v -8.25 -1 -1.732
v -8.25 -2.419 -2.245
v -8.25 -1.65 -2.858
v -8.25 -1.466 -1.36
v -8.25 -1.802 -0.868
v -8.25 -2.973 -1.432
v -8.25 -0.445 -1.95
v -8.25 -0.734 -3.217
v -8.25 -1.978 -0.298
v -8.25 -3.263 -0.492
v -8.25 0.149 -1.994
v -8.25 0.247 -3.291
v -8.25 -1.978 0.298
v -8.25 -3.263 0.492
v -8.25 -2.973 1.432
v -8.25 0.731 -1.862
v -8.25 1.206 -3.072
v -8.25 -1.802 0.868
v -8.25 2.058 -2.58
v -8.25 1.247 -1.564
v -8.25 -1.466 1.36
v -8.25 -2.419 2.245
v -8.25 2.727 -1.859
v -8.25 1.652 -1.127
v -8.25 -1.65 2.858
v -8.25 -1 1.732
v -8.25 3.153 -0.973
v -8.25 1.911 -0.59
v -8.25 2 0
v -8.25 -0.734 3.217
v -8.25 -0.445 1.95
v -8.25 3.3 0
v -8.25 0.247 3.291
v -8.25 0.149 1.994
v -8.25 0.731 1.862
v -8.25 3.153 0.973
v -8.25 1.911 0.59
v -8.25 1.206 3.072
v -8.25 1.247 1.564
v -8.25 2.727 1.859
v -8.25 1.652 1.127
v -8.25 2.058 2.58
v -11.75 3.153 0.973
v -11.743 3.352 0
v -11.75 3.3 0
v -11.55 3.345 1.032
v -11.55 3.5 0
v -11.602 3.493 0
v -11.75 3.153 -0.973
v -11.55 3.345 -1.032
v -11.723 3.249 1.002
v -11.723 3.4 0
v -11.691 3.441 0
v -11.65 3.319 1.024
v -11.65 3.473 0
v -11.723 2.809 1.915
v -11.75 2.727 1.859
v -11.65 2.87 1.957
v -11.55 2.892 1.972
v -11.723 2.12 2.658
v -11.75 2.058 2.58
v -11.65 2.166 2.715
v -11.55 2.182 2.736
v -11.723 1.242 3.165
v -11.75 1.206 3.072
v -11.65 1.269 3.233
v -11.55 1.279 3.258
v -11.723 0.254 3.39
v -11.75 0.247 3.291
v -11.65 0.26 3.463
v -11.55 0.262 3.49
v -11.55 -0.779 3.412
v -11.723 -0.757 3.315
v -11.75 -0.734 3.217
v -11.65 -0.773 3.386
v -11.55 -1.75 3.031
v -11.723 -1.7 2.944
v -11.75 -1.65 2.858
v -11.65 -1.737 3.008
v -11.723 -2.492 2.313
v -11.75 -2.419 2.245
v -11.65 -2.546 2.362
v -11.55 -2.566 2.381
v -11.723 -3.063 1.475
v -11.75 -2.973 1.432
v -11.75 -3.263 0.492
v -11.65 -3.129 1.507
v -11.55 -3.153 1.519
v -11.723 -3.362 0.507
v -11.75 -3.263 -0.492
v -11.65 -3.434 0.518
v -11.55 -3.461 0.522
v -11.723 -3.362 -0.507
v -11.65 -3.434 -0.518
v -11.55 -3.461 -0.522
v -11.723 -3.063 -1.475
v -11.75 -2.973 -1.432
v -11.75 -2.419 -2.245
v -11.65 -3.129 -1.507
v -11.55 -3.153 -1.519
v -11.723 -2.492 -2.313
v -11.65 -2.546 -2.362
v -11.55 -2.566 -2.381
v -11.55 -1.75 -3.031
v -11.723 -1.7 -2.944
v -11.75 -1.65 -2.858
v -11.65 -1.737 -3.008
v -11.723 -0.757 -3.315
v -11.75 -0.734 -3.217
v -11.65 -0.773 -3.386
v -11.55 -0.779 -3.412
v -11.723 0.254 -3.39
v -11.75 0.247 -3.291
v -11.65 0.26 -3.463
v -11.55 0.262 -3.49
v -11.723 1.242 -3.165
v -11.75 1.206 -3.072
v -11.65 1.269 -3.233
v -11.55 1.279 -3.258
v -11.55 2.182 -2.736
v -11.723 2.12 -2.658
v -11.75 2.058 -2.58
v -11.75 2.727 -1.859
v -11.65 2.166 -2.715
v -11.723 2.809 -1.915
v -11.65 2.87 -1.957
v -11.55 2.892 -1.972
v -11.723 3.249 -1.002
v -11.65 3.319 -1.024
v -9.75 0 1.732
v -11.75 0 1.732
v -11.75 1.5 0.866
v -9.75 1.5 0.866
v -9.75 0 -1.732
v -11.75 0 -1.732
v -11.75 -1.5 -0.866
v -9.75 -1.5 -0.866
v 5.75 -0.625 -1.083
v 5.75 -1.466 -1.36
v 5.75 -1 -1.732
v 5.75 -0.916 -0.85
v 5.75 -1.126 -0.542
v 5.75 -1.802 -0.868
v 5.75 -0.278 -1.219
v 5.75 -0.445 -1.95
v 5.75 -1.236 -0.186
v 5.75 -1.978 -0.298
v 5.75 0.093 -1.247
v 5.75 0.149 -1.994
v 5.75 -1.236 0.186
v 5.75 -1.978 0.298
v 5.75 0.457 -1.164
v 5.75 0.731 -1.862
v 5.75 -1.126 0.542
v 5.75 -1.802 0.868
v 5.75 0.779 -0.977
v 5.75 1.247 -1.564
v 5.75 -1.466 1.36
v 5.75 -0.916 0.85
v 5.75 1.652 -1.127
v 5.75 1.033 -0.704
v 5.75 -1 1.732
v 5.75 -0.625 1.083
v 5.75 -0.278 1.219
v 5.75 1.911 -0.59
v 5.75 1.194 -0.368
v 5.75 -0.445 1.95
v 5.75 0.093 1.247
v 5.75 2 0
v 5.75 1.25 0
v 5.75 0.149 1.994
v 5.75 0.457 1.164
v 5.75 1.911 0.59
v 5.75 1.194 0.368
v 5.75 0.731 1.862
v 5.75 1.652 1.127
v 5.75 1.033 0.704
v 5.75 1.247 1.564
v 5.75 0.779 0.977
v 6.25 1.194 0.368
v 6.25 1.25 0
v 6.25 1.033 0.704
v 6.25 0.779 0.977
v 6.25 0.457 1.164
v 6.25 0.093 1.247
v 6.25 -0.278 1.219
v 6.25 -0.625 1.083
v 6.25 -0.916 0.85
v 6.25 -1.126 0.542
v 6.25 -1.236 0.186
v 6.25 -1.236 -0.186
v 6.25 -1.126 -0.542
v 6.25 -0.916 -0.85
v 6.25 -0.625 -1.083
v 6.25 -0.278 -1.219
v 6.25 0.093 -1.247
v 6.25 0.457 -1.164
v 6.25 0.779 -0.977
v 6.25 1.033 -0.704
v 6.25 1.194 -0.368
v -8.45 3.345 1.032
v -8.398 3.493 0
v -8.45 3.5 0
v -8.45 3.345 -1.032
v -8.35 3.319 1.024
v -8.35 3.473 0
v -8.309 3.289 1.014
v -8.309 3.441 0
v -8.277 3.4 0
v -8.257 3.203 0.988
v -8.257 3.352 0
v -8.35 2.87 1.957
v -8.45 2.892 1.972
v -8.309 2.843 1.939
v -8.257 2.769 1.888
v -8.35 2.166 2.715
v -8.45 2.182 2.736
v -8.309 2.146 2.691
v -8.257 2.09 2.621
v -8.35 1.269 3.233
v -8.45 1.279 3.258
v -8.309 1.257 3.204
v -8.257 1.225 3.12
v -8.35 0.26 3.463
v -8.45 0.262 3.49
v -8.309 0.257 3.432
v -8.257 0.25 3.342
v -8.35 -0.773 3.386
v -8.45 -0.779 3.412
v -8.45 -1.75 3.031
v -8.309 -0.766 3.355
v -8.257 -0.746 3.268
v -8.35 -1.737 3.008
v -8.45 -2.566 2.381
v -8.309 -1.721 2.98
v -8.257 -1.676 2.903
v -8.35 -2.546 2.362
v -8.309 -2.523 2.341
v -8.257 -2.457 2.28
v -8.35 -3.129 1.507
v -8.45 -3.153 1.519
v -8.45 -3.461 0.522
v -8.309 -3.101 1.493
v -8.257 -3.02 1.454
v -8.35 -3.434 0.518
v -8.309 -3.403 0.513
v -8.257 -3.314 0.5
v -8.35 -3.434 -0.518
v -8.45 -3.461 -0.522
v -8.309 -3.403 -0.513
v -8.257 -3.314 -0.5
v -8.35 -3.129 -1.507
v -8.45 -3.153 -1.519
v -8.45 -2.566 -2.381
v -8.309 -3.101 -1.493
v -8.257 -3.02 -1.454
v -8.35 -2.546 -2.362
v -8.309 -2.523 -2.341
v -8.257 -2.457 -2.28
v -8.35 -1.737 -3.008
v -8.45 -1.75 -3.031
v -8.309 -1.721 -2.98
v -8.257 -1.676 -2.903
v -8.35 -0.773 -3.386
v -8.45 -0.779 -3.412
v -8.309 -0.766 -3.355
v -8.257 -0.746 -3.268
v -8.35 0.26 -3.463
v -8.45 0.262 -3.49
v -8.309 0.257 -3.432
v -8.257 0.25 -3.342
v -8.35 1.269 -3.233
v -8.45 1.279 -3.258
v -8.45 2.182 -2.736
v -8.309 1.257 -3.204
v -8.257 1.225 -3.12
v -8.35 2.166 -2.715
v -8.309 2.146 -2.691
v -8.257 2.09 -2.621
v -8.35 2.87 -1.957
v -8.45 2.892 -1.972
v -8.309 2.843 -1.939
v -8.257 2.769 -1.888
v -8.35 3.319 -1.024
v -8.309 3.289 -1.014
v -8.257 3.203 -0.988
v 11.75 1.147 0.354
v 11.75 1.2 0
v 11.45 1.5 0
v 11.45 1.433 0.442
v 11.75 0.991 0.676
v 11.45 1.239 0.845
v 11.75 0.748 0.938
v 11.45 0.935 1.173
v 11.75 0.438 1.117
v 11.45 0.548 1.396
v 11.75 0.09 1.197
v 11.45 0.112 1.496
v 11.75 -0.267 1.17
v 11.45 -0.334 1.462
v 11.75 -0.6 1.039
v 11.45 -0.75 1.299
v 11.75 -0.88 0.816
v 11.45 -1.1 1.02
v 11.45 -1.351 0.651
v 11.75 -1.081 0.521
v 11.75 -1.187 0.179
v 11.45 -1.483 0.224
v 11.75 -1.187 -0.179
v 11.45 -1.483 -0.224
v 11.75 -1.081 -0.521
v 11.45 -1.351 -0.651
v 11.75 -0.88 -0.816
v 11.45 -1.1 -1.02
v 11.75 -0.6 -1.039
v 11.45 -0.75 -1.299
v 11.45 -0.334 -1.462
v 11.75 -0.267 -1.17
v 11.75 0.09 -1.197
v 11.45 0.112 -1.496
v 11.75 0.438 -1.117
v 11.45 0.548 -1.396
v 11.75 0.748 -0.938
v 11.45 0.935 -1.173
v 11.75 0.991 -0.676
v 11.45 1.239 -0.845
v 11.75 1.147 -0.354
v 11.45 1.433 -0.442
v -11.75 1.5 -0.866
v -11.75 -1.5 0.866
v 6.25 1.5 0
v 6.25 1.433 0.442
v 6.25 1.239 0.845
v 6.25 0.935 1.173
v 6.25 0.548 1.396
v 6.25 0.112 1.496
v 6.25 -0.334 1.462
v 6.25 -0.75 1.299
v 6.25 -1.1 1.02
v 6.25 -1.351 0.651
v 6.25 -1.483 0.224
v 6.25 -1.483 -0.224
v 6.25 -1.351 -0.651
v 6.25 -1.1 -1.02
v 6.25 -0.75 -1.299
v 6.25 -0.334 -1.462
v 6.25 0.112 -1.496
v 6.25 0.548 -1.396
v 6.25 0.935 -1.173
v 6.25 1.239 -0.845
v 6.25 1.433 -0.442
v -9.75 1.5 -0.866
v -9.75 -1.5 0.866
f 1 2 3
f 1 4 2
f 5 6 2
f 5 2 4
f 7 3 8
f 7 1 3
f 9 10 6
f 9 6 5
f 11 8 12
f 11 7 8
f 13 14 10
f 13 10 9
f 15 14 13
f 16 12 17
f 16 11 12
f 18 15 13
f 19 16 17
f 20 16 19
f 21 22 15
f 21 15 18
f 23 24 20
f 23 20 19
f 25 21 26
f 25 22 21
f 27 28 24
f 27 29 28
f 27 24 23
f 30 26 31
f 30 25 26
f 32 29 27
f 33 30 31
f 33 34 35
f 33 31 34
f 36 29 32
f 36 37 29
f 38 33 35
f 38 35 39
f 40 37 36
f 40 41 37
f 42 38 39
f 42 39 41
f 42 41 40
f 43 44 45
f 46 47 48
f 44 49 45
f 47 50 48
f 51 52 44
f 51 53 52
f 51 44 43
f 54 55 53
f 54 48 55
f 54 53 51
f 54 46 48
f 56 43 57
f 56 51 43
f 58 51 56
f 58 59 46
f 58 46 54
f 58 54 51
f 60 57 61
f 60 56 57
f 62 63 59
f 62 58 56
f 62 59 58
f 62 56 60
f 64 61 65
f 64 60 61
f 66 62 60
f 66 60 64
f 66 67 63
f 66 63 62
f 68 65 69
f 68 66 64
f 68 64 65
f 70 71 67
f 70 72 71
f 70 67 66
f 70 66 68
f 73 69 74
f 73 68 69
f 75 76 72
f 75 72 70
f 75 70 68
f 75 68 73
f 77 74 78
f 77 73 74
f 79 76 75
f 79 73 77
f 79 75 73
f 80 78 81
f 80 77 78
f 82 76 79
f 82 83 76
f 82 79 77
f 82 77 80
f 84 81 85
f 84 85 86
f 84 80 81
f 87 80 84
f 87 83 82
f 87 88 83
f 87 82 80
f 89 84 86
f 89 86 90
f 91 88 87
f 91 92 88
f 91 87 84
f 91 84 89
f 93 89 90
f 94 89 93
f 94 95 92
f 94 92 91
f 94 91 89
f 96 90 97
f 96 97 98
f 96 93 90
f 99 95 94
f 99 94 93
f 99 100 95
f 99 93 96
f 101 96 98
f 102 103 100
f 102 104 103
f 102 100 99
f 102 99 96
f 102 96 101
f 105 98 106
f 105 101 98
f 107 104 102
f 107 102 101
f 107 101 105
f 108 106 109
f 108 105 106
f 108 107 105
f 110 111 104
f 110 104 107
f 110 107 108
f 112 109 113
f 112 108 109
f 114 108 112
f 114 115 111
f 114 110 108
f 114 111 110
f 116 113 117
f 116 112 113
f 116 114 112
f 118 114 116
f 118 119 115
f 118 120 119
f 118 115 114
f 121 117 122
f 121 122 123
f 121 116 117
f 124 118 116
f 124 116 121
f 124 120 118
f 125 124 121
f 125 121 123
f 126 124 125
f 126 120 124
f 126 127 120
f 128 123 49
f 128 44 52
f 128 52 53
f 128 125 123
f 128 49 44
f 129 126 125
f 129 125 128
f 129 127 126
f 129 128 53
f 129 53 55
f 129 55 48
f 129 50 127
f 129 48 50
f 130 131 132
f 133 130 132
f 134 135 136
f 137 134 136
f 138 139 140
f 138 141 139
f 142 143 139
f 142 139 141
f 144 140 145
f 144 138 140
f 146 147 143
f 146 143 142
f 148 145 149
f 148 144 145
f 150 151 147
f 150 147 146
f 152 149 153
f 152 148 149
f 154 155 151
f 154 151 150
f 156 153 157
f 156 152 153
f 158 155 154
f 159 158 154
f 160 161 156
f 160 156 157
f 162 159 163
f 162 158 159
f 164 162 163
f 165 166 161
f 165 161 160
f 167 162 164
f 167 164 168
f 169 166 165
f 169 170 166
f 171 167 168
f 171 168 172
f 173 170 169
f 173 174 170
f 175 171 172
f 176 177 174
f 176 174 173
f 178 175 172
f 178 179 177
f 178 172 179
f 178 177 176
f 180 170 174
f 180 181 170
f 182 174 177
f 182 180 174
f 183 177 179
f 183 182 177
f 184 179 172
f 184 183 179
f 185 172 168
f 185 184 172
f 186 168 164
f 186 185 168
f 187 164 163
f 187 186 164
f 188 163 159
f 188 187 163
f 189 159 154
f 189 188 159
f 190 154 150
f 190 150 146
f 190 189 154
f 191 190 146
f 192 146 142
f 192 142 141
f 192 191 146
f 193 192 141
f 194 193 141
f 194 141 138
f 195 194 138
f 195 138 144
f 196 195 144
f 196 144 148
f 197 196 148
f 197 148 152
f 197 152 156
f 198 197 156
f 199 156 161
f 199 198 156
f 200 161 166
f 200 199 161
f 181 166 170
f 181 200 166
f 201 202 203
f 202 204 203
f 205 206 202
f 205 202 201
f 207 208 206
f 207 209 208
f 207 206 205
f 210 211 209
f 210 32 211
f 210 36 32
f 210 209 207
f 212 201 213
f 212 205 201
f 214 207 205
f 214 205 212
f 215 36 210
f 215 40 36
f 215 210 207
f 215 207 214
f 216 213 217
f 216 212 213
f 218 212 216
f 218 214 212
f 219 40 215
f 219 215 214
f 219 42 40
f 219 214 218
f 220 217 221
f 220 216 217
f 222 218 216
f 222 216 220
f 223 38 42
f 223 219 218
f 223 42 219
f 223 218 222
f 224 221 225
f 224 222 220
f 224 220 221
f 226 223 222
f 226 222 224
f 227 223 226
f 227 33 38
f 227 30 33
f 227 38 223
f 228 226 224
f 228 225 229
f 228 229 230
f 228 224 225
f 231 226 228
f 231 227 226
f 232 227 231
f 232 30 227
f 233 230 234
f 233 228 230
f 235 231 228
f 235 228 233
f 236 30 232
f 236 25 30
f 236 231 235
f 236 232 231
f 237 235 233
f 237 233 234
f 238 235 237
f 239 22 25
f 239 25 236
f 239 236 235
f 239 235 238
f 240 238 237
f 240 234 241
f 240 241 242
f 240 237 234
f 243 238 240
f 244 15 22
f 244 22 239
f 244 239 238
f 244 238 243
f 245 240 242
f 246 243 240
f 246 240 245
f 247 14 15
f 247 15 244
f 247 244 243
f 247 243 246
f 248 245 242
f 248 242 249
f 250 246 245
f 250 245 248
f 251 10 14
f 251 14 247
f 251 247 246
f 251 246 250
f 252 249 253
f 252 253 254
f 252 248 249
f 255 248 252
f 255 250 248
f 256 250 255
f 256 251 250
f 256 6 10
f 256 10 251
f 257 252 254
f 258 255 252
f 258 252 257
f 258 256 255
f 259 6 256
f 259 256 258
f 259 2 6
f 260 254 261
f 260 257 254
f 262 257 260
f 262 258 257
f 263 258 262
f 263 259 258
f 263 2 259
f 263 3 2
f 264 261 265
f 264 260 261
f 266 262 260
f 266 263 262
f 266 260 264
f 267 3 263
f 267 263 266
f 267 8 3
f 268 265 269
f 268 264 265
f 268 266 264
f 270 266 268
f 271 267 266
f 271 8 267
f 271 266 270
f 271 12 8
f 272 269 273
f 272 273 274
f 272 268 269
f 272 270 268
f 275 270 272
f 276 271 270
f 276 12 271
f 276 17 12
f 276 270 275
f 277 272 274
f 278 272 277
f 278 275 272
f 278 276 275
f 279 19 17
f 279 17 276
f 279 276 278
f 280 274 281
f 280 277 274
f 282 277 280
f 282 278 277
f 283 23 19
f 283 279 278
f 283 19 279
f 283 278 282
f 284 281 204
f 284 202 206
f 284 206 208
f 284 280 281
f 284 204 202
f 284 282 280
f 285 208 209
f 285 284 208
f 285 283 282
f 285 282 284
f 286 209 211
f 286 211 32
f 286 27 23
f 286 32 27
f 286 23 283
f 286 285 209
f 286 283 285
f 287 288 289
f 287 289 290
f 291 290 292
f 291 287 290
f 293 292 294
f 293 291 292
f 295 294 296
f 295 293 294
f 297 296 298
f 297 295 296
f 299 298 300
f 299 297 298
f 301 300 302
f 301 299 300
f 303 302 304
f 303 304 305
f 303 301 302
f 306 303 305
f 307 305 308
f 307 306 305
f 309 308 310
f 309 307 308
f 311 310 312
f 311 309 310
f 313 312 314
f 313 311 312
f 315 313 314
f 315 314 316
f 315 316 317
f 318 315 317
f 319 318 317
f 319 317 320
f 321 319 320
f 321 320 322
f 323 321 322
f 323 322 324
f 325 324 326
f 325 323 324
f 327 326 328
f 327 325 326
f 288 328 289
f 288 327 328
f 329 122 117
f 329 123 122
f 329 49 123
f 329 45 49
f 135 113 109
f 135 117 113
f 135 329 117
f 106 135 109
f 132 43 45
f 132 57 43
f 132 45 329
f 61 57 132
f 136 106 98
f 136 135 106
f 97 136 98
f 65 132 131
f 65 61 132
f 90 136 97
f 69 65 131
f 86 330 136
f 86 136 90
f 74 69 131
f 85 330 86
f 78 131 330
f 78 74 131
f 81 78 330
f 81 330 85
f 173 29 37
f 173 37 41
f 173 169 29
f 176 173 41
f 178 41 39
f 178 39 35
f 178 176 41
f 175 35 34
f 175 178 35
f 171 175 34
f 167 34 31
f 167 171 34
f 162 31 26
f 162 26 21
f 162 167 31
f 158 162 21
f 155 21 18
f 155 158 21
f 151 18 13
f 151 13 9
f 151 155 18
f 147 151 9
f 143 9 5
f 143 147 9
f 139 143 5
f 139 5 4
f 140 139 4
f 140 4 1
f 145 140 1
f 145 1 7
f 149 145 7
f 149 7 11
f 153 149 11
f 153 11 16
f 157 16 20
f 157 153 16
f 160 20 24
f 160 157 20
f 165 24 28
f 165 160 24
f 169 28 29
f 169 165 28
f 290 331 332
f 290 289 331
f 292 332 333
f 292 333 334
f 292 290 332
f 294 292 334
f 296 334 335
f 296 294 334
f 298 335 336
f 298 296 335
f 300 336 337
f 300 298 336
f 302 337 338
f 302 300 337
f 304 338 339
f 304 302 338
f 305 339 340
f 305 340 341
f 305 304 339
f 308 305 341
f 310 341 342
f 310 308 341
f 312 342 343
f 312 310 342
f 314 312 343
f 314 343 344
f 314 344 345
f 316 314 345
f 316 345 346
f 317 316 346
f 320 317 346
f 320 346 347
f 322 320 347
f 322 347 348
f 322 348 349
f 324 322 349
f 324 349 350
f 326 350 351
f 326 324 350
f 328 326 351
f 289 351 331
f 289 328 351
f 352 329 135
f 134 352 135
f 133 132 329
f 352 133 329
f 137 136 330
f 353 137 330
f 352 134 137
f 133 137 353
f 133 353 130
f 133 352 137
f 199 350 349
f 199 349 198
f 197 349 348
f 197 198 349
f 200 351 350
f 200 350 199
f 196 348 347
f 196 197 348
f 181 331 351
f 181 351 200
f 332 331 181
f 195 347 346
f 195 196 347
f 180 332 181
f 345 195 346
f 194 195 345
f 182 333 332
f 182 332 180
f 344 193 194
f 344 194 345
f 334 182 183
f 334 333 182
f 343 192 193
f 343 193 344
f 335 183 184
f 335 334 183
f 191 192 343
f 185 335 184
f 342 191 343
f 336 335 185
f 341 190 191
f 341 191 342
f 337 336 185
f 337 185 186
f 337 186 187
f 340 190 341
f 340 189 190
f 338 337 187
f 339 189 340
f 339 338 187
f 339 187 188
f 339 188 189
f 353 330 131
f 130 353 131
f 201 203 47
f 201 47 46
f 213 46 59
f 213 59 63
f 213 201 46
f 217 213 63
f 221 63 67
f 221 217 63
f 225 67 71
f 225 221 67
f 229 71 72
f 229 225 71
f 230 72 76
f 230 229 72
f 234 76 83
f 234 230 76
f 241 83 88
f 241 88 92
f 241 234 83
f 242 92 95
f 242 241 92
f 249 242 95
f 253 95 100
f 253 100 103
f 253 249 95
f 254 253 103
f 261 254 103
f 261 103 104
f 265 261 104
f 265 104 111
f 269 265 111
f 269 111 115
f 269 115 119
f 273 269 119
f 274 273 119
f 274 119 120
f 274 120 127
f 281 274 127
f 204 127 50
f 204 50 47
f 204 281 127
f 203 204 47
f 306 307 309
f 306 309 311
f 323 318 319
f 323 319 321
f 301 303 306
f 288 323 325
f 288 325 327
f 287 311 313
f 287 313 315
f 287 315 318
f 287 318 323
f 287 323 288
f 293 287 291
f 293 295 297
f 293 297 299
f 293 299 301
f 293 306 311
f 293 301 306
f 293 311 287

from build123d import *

# Parameters (mm, degrees)
FILLET_1_R          = 0.2
CHAMFER_1_SIZE      = 0.3
SKETCH_3_W          = 0.5
SKETCH_3_H          = 0.25
CUT_EXTRUDE_1_DEPTH = 2


with BuildPart() as part:
    # 草图1 → 旋转1 (revolve)
    with BuildSketch(Plane.XY):
        Polygon((-11.75, 0), (-11.75, 3.5), (-8.25, 3.5), (-8.25, 2), (5.75, 2), (5.75, 1.5), (11.75, 1.5), (11.75, 0), align=None)
    revolve(axis=Axis((-11.75, 0, 0), (1, 0, 0)))

    # 圆角1
    fillet_1_edges = [part.edges().sort_by_distance(p)[0] for p in [
        (-8.25, -3.5, 0),
        (-11.75, -3.5, 0),
    ]]
    fillet(fillet_1_edges, radius=FILLET_1_R)

    # 倒角1
    chamfer_1_edges = [part.edges().sort_by_distance(p)[0] for p in [
        (11.75, -1.5, 0),
    ]]
    chamfer(chamfer_1_edges, length=CHAMFER_1_SIZE)

    # 草图3 → 切除-旋转1 (revolve, cut)
    with BuildSketch(Plane.XY):
        with Locations((6, 1.375)):
            Rectangle(SKETCH_3_W, SKETCH_3_H)
    revolve(axis=Axis((5.75, 0, 0), (1, 0, 0)), mode=Mode.SUBTRACT)

    # 草图4 → 切除-拉伸1 (cut)
    with BuildSketch(Plane.ZY.offset(11.75)):
        Polygon((1.732050808, 0), (0.866025404, 1.5), (-0.866025404, 1.5), (-1.732050808, 0), (-0.866025404, -1.5), (0.866025404, -1.5), align=None)
    extrude(amount=-CUT_EXTRUDE_1_DEPTH, mode=Mode.SUBTRACT)


solid = part.part
